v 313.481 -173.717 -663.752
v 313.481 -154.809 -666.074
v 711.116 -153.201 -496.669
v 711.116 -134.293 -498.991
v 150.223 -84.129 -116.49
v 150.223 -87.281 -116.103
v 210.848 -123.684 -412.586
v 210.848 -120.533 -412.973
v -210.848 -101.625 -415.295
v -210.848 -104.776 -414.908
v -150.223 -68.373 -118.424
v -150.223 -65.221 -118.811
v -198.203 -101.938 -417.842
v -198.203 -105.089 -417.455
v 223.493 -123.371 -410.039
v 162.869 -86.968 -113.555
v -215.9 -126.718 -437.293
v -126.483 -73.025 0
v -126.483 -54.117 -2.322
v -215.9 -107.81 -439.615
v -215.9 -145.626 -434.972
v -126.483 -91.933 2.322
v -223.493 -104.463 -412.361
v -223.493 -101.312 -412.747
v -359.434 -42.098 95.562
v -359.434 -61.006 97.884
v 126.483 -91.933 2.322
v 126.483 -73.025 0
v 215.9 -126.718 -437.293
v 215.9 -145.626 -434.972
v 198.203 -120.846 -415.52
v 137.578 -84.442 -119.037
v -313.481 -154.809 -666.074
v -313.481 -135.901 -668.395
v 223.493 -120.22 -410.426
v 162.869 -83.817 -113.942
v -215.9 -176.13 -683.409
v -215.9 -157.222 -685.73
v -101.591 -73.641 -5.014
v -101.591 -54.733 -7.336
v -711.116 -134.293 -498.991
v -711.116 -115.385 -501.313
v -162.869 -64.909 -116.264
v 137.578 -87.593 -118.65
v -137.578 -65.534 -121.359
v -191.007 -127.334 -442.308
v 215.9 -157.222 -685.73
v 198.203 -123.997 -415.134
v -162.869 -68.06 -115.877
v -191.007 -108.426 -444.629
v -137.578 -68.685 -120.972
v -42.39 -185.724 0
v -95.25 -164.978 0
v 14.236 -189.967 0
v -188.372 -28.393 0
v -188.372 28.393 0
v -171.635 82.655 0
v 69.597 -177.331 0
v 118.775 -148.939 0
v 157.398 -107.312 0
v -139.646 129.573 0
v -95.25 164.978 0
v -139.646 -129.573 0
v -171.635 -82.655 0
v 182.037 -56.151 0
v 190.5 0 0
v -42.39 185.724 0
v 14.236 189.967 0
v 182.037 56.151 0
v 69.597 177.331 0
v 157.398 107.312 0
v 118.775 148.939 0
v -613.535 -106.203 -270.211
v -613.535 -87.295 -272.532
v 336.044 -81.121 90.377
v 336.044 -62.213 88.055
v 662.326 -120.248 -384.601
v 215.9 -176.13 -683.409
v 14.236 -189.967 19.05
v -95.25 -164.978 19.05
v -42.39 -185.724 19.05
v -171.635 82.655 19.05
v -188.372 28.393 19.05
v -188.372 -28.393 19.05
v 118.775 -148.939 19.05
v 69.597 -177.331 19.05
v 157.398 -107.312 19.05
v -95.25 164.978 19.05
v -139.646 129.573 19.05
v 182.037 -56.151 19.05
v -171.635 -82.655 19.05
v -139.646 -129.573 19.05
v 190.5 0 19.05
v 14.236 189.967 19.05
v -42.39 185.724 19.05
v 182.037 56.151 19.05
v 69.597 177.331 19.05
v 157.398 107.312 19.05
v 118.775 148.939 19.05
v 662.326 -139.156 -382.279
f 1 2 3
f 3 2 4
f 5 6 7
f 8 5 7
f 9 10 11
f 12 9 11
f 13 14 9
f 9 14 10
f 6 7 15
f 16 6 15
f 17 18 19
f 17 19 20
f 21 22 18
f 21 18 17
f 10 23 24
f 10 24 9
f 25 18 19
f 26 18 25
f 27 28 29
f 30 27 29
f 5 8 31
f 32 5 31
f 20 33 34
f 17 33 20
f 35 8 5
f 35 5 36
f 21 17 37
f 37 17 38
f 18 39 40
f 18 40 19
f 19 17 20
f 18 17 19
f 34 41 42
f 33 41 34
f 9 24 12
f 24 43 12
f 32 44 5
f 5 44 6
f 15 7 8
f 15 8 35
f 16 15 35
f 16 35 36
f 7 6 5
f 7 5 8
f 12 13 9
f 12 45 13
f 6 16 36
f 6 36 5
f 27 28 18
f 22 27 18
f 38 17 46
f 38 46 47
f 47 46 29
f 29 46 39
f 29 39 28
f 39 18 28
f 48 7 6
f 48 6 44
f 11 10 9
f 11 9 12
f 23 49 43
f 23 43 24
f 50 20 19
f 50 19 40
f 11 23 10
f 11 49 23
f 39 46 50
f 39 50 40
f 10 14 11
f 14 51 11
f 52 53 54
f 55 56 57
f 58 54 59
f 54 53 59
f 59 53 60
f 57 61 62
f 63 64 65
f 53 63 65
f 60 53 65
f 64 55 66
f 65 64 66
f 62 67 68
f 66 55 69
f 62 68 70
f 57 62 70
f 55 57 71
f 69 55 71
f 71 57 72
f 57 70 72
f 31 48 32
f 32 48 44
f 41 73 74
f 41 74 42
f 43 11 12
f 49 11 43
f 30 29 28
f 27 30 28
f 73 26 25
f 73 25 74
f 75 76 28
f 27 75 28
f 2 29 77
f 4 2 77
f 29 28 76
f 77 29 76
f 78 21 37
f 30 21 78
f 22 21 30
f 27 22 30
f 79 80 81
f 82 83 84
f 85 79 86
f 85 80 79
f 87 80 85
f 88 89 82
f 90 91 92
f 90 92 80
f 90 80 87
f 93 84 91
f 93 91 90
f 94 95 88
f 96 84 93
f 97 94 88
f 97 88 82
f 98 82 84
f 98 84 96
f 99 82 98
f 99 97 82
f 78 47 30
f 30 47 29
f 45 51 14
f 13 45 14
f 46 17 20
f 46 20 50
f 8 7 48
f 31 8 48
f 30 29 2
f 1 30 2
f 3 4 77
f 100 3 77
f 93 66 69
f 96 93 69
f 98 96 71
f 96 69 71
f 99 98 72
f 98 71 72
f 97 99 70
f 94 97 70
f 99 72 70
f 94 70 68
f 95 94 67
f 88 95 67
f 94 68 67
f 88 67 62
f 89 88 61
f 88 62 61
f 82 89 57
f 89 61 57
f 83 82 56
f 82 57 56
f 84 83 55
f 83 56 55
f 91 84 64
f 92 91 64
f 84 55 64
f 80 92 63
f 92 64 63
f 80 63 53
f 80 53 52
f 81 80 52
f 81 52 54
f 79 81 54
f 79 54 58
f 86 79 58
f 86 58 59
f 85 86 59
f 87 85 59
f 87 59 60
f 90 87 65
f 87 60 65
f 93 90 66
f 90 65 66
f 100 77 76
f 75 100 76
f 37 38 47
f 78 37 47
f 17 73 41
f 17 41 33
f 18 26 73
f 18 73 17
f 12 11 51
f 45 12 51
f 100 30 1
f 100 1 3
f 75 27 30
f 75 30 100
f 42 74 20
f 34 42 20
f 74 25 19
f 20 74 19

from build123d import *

# Parameters (mm, degrees)
F0_R      = 190.5
F2_DEPTH  = 19.05
F5_DEPTH  = 19.05
F6_DEPTH  = 19.05
F7_DEPTH  = 19.05
F9_DEPTH  = 19.05
F11_DEPTH = 3.175
F14_DEPTH = 3.175


with BuildPart() as f2:
    # F0 (on Top) → F2 (new body)
    with BuildSketch(Plane.XY):
        Circle(F0_R)
    extrude(amount=F2_DEPTH)


with BuildPart() as f5:
    # F4 (on line) → F5 (new body)
    with BuildSketch(Plane(origin=(0, -71.9404227057, 8.8331732131), x_dir=(1, 0, 0), z_dir=(0, -0.9925461516, 0.1218693434))):
        Polygon((126.4830102227, -8.8995088022), (-126.4830102227, -8.8995088022), (-215.9, -449.4767169954), (-215.9, -699.7795088022), (215.9, -699.7795088022), (215.9, -449.4767169954), align=None)
    extrude(amount=F5_DEPTH)

    # F8 (on face) → F9 (join)
    with BuildSketch(Plane(origin=(0, -71.9404227057, 8.8331732131), x_dir=(1, 0, 0), z_dir=(0, -0.9925461516, 0.1218693434))):
        Polygon((-101.5905031908, -13.9515473675), (-126.4830102227, -8.8995088022), (-215.9, -449.4767169954), (-191.0074929681, -454.5287555607), align=None)
    extrude(amount=-F9_DEPTH)


with BuildPart() as f6:
    # F4 (on line) → F6 (new body)
    with BuildSketch(Plane(origin=(0, -71.9404227057, 8.8331732131), x_dir=(1, 0, 0), z_dir=(0, -0.9925461516, 0.1218693434))):
        Polygon((336.0436092069, 79.8171695326), (126.4830102227, -8.8995088022), (215.9, -449.4767169954), (313.4806151707, -679.9751142331), (711.1158441221, -511.6377603963), (662.3255365367, -396.3885617774), align=None)
    extrude(amount=F6_DEPTH)


with BuildPart() as f7:
    # F4 (on line) → F7 (new body)
    with BuildSketch(Plane(origin=(0, -71.9404227057, 8.8331732131), x_dir=(1, 0, 0), z_dir=(0, -0.9925461516, 0.1218693434))):
        Polygon((-215.9, -449.4767169954), (-126.4830102227, -8.8995088022), (-359.4339167923, 89.7193668172), (-613.5352289514, -281.1393631585), (-711.1158441221, -511.6377603963), (-313.4806151708, -679.9751142331), align=None)
    extrude(amount=-F7_DEPTH)


with BuildPart() as f11:
    # F10 (on face) → F11 (new body)
    with BuildSketch(Plane(origin=(0, -53.0324185169, 6.5115622212), x_dir=(-1, 0, 0), z_dir=(0, 0.9925461516, -0.1218693434))):
        Polygon((198.2025678624, -427.1506455546), (210.8479614347, -424.5842099634), (150.2234986505, -125.8741255804), (137.5781050783, -128.4405611716), align=None)
    extrude(amount=F11_DEPTH)


with BuildPart() as f12_1:
    # F12: instance of F11
    add(f11.part.mirror(Plane(origin=(-180.5357300426, -84.9987494635, -266.8595566529), x_dir=(-0.0247263315, -0.9996942575, 0), z_dir=(-0.9800199619, 0.0242397096, 0.197416592))))


with BuildPart() as f14:
    # F13 (on face) → F14 (new body)
    with BuildSketch(Plane(origin=(0, -71.9404227057, 8.8331732131), x_dir=(1, 0, 0), z_dir=(0, -0.9925461516, 0.1218693434))):
        Polygon((210.8479614347, -424.5842099634), (223.4933550069, -422.0177743722), (162.8688922227, -123.3076899892), (150.2234986505, -125.8741255804), align=None)
    extrude(amount=-F14_DEPTH)


with BuildPart() as f15_1:
    # F15: instance of F14
    add(f14.part.mirror(Plane(origin=(180.5357300426, -103.9067536522, -264.537945661), x_dir=(0.0247263315, -0.9996942575, 0), z_dir=(-0.9800199619, -0.0242397096, -0.197416592))))


solid = Compound([f2.part, f5.part, f6.part, f7.part, f11.part, f12_1.part, f14.part, f15_1.part])
